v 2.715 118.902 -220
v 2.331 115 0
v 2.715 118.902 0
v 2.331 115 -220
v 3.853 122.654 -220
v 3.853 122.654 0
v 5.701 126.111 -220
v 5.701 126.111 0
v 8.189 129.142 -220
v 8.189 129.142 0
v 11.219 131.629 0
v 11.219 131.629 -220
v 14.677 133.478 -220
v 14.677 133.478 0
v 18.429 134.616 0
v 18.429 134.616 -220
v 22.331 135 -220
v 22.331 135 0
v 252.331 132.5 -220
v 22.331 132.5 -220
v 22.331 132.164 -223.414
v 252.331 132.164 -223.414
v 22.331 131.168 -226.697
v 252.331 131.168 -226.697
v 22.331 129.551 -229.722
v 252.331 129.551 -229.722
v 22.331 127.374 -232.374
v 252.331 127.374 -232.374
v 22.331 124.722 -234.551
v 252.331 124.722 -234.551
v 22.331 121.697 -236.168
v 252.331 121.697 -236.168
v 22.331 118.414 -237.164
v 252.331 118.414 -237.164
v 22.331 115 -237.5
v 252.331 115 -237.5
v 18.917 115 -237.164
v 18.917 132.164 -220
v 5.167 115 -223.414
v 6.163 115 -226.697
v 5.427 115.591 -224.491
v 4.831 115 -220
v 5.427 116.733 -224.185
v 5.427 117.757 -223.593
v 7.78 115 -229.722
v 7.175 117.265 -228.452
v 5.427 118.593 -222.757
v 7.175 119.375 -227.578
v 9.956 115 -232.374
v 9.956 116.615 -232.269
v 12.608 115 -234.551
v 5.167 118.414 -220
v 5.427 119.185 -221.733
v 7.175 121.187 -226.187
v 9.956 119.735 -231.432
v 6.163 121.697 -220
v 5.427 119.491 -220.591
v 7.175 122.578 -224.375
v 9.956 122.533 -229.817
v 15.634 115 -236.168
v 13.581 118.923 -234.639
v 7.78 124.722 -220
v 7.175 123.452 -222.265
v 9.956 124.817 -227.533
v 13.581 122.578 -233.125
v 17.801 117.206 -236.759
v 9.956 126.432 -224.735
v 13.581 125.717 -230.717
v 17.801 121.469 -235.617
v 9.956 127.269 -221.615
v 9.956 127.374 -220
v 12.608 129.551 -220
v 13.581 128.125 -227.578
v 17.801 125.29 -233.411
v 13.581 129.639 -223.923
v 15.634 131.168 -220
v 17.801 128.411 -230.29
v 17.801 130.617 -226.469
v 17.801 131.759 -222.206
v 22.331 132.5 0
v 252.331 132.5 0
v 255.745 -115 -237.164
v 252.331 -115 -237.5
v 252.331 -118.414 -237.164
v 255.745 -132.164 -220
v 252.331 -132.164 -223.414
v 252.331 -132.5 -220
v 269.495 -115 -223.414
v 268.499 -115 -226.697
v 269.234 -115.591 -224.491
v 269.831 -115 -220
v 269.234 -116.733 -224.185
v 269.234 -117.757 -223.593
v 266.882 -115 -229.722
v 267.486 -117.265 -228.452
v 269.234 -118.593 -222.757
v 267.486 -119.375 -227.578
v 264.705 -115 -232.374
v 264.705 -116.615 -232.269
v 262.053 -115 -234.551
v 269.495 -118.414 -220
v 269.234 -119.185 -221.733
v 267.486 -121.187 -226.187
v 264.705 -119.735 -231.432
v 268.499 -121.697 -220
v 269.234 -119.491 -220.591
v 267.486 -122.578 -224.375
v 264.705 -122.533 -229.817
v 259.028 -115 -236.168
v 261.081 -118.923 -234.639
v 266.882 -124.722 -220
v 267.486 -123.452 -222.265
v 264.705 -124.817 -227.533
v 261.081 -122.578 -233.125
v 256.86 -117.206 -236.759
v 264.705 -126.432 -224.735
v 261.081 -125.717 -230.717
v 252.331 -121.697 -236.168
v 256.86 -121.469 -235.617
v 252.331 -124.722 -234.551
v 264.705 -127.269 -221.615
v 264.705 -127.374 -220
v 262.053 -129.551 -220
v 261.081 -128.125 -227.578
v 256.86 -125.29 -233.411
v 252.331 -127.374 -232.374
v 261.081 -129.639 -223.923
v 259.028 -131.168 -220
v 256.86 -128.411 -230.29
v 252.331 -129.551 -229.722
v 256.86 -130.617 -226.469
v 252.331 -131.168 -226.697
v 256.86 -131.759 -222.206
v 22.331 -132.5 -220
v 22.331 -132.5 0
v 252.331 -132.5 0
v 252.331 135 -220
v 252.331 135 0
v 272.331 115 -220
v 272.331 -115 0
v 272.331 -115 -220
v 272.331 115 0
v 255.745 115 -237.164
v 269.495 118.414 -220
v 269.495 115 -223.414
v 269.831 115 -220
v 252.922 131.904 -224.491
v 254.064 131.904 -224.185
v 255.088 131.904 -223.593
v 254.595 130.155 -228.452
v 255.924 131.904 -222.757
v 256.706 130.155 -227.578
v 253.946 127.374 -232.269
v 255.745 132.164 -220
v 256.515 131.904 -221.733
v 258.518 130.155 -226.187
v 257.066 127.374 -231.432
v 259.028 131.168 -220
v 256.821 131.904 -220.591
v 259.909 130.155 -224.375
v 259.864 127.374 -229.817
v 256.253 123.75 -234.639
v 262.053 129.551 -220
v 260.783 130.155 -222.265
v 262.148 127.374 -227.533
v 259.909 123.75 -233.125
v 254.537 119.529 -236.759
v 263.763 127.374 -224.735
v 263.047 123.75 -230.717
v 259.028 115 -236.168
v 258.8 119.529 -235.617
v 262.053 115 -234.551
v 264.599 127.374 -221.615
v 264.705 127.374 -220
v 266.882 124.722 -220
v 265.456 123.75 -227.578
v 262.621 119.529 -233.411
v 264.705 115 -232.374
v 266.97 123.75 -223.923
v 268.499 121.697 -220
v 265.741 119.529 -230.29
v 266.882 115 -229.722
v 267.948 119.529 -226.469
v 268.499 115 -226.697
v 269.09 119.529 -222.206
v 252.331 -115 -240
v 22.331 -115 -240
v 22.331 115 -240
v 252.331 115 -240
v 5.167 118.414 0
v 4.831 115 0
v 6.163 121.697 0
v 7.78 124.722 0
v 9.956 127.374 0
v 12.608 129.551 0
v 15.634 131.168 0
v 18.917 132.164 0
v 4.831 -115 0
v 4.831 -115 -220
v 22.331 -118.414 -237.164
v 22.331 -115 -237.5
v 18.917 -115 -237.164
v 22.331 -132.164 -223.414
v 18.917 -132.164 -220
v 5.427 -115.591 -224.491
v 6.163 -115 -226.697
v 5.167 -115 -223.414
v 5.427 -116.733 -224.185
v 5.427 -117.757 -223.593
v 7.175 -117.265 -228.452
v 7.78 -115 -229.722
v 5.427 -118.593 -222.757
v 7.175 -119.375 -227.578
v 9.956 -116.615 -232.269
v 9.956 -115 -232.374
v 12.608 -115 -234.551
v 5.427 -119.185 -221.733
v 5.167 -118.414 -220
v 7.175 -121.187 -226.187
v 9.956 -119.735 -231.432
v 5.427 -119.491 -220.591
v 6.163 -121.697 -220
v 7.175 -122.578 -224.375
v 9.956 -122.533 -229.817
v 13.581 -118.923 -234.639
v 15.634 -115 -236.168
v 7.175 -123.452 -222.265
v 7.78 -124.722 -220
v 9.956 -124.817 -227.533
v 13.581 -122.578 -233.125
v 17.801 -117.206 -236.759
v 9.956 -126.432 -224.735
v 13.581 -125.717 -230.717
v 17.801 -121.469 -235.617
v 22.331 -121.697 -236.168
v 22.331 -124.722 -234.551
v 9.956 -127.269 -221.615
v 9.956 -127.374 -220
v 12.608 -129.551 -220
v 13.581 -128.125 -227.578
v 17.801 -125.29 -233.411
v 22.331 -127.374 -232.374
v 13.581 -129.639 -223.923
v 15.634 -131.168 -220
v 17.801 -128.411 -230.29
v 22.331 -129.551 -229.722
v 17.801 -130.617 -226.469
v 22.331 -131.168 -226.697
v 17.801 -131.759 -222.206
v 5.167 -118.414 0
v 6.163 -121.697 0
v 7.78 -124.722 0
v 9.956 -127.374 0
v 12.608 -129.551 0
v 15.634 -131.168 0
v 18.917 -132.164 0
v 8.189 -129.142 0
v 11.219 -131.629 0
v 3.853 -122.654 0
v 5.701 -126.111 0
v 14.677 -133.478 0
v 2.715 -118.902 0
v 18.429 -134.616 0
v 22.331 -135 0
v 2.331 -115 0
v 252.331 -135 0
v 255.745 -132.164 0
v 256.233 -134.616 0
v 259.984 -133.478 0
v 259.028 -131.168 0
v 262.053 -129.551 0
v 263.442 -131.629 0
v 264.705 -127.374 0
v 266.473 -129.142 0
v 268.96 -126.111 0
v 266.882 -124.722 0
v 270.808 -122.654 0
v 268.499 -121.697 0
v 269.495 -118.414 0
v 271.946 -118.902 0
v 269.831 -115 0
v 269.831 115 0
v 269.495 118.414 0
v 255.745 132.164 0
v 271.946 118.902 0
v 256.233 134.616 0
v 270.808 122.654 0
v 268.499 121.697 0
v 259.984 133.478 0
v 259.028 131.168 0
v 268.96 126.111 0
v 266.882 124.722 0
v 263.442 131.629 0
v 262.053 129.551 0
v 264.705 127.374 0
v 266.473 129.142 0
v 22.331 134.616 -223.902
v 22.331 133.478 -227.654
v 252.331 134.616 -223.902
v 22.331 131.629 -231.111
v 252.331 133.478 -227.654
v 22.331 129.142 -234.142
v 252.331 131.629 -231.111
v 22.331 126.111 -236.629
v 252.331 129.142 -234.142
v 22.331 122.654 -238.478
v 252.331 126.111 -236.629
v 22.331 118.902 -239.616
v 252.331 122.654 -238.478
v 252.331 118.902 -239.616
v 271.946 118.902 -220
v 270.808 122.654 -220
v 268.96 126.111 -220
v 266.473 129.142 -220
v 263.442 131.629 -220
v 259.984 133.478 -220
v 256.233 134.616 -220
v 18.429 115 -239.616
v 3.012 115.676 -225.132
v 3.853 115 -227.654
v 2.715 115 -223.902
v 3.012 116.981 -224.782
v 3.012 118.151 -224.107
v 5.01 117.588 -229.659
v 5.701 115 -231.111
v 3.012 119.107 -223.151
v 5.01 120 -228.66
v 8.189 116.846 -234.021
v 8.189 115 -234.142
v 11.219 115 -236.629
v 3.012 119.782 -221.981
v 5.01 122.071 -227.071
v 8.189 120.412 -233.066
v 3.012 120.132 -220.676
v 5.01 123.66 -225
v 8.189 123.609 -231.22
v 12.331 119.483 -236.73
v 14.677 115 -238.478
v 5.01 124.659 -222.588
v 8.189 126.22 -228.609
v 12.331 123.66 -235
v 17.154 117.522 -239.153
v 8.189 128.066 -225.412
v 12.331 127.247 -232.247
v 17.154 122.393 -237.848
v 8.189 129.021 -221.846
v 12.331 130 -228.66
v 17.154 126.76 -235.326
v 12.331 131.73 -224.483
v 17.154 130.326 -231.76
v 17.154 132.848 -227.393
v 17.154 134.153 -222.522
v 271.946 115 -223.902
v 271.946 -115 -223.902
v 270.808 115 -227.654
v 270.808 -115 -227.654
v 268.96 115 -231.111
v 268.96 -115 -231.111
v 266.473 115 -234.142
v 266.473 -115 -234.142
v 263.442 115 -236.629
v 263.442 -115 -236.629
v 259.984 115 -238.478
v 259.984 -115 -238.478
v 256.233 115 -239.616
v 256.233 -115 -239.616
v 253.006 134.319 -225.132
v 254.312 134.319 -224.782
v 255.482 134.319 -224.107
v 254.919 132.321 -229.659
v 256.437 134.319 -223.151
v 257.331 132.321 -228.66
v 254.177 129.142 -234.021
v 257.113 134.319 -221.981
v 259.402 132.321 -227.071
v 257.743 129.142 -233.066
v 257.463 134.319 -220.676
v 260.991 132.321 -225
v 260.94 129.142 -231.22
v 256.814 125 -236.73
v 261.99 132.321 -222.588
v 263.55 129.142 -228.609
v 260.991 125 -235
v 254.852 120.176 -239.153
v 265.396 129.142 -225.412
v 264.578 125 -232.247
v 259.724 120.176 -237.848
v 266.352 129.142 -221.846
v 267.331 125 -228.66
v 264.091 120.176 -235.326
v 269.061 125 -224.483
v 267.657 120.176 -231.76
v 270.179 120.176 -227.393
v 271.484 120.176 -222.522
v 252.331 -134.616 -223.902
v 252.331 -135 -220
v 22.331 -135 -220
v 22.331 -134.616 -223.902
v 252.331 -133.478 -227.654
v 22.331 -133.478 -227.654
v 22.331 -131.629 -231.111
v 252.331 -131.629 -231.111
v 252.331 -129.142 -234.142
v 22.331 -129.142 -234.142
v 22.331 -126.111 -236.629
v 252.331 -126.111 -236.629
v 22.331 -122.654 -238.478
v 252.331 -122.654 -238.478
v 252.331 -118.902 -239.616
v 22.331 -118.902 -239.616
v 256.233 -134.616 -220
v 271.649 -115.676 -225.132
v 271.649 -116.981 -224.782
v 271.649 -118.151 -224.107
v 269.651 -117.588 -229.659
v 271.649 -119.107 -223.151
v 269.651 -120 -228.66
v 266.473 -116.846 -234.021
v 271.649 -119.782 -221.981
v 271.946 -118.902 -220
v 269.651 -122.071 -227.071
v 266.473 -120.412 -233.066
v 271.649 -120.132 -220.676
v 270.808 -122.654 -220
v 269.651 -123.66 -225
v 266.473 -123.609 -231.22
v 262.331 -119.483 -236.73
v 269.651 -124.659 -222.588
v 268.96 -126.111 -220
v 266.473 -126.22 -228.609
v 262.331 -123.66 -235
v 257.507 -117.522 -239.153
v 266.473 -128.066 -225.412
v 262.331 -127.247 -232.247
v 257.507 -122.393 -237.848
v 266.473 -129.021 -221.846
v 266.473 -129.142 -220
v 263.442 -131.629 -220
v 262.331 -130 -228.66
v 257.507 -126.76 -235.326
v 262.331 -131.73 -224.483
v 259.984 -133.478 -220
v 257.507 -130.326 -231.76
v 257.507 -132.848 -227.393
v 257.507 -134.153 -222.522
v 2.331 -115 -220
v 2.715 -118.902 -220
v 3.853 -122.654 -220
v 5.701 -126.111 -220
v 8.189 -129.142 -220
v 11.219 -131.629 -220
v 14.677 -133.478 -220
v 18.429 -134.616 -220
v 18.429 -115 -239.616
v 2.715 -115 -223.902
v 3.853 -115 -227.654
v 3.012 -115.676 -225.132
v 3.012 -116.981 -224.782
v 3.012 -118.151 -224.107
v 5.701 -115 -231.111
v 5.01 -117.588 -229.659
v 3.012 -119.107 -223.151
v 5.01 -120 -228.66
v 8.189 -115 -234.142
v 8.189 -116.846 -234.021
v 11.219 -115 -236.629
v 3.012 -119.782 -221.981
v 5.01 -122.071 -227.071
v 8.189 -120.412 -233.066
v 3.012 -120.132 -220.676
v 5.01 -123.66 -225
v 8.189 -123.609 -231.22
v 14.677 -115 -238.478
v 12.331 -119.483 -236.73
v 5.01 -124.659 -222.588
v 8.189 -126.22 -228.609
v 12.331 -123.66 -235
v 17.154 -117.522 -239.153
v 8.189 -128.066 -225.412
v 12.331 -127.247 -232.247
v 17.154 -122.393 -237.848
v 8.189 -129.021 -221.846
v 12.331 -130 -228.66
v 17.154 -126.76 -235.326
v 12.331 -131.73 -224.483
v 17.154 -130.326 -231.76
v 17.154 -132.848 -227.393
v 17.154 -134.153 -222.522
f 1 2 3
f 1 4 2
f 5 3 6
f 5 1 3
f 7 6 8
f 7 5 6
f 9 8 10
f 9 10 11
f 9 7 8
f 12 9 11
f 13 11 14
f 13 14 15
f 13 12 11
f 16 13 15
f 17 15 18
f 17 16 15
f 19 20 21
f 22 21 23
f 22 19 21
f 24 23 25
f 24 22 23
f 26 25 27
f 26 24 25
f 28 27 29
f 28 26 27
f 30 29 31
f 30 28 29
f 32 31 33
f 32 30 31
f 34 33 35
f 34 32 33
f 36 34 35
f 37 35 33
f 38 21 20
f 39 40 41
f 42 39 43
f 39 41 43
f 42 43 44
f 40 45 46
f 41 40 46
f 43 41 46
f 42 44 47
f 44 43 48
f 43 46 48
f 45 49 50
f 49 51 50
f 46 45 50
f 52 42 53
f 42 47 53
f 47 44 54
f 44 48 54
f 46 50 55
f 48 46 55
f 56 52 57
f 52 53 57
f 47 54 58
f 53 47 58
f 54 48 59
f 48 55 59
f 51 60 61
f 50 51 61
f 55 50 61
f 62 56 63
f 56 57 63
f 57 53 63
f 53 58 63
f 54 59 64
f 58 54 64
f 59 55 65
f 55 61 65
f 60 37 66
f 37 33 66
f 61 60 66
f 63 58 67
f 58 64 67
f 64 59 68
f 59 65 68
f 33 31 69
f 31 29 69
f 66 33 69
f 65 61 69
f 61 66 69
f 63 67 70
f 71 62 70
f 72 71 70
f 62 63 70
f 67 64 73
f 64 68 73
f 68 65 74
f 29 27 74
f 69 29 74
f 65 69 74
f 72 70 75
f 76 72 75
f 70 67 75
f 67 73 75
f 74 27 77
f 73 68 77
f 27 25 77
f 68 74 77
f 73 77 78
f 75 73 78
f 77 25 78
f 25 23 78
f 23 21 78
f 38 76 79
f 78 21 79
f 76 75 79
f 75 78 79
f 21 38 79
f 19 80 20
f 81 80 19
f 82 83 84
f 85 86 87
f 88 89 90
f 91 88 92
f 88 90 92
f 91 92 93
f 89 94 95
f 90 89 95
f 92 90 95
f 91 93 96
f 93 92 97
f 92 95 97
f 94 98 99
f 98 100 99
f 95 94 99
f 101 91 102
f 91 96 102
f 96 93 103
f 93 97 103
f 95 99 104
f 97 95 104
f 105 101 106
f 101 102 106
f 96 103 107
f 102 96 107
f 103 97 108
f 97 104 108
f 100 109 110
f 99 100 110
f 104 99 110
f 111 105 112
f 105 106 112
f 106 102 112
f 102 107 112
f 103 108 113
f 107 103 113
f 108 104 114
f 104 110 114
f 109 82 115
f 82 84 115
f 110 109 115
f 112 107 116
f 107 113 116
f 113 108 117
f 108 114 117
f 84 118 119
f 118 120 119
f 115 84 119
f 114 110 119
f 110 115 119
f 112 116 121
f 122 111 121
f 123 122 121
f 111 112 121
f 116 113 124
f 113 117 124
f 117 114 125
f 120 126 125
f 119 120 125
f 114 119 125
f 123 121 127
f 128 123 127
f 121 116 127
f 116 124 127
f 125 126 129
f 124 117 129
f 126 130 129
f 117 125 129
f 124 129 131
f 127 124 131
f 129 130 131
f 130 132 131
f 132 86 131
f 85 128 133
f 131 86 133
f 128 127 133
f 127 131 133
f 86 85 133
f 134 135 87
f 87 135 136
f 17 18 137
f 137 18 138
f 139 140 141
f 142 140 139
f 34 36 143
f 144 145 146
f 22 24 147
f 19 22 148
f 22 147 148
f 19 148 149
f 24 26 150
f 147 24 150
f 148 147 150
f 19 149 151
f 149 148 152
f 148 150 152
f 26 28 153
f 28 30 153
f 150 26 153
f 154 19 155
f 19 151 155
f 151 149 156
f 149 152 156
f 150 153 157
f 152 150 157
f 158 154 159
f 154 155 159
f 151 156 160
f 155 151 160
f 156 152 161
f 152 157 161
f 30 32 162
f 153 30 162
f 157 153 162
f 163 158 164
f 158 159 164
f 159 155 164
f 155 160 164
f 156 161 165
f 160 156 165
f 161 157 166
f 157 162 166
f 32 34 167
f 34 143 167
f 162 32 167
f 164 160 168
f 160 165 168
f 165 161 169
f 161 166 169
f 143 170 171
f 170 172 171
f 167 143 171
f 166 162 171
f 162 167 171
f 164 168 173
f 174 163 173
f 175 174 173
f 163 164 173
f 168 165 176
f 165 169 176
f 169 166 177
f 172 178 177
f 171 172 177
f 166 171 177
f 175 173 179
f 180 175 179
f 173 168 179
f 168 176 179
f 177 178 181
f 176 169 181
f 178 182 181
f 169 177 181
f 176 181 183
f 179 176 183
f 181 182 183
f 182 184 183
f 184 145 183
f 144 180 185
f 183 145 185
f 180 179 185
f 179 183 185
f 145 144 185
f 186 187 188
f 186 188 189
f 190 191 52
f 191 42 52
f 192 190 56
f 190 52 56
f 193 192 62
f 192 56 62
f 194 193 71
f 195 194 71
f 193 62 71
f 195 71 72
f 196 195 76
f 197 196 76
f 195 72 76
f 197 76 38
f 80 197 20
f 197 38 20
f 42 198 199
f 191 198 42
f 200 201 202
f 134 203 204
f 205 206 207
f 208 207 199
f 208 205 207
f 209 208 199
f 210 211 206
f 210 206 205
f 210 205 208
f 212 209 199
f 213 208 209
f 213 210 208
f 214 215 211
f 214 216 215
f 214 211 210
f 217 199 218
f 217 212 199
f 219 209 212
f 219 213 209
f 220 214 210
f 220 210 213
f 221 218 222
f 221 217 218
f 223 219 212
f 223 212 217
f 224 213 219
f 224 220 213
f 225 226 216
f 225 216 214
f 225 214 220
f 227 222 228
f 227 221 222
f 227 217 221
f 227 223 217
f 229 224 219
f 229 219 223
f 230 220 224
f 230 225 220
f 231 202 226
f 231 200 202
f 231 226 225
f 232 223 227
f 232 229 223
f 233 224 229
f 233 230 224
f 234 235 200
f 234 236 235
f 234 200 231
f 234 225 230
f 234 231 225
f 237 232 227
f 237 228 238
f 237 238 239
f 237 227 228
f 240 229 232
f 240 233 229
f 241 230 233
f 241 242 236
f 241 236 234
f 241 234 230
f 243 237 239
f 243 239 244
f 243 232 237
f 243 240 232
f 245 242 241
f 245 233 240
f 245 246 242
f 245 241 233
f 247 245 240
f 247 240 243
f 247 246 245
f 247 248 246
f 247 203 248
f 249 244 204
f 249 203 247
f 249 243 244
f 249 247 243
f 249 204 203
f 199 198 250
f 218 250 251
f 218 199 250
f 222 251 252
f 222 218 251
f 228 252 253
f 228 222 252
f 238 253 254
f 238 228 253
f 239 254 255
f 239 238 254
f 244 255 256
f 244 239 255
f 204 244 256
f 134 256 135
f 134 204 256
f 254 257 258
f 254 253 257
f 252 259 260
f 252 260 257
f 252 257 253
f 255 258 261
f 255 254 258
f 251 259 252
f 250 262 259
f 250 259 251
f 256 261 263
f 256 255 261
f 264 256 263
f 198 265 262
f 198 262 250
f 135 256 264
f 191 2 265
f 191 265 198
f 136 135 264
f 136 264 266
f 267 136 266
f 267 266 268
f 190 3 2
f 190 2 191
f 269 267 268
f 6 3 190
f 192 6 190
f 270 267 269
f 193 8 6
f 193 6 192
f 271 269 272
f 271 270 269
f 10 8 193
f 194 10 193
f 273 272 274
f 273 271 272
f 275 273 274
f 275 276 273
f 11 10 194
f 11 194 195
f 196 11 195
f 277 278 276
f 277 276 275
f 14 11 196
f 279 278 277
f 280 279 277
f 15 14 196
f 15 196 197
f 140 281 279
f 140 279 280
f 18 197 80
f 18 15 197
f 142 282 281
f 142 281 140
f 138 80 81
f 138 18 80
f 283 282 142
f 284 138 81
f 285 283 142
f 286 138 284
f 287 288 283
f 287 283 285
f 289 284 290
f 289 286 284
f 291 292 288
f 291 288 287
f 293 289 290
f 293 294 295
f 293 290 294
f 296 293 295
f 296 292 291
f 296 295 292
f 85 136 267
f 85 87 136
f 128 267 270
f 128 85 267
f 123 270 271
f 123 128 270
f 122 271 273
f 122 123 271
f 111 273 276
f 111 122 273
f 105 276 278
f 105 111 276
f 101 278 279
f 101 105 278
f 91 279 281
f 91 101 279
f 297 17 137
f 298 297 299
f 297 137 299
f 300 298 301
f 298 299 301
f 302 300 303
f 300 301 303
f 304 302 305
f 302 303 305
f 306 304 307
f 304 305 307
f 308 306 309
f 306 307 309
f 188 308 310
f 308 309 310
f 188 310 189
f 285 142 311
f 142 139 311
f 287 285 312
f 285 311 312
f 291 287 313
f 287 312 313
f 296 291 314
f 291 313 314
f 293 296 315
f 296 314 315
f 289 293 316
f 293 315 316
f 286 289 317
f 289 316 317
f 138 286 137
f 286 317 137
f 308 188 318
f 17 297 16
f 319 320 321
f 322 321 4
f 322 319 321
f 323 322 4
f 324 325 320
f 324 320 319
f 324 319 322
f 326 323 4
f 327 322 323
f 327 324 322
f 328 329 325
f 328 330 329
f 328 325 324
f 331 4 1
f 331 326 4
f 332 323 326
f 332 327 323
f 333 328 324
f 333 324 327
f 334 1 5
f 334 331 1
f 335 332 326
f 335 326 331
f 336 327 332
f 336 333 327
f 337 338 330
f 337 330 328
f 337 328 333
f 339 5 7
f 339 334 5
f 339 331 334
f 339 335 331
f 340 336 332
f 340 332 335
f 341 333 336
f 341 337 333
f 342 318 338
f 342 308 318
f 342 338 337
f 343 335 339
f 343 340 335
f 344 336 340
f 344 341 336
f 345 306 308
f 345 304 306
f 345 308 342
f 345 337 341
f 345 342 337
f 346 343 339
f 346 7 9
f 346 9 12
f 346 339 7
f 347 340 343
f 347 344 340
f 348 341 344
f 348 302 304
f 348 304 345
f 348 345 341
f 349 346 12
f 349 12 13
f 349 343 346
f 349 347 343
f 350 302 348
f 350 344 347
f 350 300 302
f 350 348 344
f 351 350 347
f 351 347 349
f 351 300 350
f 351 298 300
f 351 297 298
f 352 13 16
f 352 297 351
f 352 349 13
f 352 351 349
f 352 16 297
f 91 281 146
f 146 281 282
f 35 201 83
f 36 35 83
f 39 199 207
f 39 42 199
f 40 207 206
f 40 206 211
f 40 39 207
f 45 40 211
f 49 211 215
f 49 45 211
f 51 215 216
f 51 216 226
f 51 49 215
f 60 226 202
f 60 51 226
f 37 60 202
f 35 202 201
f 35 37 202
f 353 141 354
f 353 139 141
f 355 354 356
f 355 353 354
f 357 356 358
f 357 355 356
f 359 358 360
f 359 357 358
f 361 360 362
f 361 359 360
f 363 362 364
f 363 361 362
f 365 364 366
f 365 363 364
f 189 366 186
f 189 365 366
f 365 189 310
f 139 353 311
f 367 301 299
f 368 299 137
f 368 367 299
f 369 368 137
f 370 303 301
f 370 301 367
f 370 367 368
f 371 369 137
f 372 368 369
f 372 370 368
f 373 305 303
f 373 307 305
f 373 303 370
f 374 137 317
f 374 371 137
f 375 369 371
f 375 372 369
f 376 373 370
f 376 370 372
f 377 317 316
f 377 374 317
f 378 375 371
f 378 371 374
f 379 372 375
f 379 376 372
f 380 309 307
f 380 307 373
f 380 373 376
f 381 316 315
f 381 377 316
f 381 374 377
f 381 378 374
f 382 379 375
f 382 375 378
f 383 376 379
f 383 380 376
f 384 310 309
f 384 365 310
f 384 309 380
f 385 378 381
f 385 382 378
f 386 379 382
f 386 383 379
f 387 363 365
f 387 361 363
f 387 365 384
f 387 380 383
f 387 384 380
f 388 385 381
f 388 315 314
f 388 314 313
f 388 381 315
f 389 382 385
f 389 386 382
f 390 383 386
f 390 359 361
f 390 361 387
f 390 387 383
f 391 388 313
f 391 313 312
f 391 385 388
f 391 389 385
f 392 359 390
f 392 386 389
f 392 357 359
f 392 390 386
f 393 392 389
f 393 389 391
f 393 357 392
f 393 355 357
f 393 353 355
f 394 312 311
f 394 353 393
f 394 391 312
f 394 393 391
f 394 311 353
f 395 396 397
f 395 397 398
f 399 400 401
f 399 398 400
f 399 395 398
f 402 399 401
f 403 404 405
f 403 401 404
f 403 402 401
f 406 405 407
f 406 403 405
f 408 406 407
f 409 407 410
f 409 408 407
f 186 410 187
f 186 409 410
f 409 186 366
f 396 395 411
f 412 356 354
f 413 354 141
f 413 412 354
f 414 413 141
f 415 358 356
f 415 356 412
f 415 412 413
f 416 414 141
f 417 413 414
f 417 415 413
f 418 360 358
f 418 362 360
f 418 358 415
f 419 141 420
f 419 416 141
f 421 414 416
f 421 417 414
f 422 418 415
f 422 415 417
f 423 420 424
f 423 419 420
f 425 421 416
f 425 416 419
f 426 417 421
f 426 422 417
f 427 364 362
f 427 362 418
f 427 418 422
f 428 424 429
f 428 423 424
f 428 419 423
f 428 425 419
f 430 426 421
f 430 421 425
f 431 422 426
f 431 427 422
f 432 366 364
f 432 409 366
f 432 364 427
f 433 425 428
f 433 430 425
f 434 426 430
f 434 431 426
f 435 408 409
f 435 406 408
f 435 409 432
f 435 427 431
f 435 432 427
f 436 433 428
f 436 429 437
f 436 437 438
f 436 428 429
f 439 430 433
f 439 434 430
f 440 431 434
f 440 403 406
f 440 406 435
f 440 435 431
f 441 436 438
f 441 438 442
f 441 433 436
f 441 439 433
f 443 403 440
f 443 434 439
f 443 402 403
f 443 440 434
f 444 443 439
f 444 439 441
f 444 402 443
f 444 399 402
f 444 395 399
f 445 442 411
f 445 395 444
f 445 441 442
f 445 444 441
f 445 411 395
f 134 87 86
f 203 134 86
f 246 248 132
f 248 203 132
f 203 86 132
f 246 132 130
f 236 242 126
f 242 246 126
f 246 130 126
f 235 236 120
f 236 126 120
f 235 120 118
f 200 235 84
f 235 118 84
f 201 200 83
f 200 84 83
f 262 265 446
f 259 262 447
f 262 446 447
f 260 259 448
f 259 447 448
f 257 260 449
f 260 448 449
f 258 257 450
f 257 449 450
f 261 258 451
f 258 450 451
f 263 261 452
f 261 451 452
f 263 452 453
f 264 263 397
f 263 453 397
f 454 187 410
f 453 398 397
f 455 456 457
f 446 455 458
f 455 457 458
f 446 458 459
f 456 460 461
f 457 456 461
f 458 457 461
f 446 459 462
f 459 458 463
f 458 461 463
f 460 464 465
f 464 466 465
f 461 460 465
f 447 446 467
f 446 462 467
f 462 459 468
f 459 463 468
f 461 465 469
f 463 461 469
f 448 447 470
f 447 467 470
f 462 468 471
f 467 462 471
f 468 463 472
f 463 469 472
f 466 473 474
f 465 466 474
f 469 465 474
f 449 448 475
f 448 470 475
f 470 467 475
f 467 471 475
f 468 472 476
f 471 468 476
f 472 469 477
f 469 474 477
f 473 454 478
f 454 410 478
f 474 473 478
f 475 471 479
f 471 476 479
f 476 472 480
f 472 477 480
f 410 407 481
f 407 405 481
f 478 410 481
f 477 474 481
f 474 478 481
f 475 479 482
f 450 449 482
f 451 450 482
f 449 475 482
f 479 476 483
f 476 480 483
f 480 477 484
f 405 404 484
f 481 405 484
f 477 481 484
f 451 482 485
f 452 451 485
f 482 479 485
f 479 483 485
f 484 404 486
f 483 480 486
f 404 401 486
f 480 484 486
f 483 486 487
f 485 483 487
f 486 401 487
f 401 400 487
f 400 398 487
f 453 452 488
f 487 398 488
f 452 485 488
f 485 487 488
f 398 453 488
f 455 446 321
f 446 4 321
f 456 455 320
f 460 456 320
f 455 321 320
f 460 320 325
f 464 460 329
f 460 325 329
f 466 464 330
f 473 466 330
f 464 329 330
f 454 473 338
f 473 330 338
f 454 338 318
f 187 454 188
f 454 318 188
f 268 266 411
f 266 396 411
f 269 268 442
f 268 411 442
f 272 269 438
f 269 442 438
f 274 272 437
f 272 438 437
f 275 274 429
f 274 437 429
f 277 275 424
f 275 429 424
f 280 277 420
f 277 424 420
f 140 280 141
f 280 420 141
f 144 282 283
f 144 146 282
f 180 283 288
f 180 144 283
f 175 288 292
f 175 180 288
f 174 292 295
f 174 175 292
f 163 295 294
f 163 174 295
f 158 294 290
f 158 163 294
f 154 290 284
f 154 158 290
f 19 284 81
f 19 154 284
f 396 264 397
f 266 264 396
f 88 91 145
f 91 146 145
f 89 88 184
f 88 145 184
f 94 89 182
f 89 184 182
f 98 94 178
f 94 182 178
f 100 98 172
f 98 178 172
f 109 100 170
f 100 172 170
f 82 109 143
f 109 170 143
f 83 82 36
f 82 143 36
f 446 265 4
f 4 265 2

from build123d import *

# Parameters (mm, degrees)
F0_W     = 270
F0_H     = 270
F1_DEPTH = 240
F2_R     = 20
F3_T     = -2.5


with BuildPart() as f1:
    # F0 (on Top) → F1 (new body)
    with BuildSketch(Plane.XY):
        with Locations((137.330786, 0)):
            Rectangle(F0_W, F0_H)
    extrude(amount=-F1_DEPTH)

    # F2
    f2_edges = [f1.edges().sort_by_distance(p)[0] for p in [
        (137.330786, -135, -240),
        (272.330786, 0, -240),
        (137.330786, 135, -240),
        (2.330786, 0, -240),
        (2.330786, -135, -120),
        (272.330786, -135, -120),
        (272.330786, 135, -120),
        (2.330786, 135, -120),
    ]]
    fillet(f2_edges, radius=F2_R)

    # F3
    f3_openings = [f1.faces().sort_by_distance(p)[0] for p in [
        (137.330786, 0, 0),
    ]]
    offset(amount=F3_T, openings=f3_openings)


solid = f1.part
